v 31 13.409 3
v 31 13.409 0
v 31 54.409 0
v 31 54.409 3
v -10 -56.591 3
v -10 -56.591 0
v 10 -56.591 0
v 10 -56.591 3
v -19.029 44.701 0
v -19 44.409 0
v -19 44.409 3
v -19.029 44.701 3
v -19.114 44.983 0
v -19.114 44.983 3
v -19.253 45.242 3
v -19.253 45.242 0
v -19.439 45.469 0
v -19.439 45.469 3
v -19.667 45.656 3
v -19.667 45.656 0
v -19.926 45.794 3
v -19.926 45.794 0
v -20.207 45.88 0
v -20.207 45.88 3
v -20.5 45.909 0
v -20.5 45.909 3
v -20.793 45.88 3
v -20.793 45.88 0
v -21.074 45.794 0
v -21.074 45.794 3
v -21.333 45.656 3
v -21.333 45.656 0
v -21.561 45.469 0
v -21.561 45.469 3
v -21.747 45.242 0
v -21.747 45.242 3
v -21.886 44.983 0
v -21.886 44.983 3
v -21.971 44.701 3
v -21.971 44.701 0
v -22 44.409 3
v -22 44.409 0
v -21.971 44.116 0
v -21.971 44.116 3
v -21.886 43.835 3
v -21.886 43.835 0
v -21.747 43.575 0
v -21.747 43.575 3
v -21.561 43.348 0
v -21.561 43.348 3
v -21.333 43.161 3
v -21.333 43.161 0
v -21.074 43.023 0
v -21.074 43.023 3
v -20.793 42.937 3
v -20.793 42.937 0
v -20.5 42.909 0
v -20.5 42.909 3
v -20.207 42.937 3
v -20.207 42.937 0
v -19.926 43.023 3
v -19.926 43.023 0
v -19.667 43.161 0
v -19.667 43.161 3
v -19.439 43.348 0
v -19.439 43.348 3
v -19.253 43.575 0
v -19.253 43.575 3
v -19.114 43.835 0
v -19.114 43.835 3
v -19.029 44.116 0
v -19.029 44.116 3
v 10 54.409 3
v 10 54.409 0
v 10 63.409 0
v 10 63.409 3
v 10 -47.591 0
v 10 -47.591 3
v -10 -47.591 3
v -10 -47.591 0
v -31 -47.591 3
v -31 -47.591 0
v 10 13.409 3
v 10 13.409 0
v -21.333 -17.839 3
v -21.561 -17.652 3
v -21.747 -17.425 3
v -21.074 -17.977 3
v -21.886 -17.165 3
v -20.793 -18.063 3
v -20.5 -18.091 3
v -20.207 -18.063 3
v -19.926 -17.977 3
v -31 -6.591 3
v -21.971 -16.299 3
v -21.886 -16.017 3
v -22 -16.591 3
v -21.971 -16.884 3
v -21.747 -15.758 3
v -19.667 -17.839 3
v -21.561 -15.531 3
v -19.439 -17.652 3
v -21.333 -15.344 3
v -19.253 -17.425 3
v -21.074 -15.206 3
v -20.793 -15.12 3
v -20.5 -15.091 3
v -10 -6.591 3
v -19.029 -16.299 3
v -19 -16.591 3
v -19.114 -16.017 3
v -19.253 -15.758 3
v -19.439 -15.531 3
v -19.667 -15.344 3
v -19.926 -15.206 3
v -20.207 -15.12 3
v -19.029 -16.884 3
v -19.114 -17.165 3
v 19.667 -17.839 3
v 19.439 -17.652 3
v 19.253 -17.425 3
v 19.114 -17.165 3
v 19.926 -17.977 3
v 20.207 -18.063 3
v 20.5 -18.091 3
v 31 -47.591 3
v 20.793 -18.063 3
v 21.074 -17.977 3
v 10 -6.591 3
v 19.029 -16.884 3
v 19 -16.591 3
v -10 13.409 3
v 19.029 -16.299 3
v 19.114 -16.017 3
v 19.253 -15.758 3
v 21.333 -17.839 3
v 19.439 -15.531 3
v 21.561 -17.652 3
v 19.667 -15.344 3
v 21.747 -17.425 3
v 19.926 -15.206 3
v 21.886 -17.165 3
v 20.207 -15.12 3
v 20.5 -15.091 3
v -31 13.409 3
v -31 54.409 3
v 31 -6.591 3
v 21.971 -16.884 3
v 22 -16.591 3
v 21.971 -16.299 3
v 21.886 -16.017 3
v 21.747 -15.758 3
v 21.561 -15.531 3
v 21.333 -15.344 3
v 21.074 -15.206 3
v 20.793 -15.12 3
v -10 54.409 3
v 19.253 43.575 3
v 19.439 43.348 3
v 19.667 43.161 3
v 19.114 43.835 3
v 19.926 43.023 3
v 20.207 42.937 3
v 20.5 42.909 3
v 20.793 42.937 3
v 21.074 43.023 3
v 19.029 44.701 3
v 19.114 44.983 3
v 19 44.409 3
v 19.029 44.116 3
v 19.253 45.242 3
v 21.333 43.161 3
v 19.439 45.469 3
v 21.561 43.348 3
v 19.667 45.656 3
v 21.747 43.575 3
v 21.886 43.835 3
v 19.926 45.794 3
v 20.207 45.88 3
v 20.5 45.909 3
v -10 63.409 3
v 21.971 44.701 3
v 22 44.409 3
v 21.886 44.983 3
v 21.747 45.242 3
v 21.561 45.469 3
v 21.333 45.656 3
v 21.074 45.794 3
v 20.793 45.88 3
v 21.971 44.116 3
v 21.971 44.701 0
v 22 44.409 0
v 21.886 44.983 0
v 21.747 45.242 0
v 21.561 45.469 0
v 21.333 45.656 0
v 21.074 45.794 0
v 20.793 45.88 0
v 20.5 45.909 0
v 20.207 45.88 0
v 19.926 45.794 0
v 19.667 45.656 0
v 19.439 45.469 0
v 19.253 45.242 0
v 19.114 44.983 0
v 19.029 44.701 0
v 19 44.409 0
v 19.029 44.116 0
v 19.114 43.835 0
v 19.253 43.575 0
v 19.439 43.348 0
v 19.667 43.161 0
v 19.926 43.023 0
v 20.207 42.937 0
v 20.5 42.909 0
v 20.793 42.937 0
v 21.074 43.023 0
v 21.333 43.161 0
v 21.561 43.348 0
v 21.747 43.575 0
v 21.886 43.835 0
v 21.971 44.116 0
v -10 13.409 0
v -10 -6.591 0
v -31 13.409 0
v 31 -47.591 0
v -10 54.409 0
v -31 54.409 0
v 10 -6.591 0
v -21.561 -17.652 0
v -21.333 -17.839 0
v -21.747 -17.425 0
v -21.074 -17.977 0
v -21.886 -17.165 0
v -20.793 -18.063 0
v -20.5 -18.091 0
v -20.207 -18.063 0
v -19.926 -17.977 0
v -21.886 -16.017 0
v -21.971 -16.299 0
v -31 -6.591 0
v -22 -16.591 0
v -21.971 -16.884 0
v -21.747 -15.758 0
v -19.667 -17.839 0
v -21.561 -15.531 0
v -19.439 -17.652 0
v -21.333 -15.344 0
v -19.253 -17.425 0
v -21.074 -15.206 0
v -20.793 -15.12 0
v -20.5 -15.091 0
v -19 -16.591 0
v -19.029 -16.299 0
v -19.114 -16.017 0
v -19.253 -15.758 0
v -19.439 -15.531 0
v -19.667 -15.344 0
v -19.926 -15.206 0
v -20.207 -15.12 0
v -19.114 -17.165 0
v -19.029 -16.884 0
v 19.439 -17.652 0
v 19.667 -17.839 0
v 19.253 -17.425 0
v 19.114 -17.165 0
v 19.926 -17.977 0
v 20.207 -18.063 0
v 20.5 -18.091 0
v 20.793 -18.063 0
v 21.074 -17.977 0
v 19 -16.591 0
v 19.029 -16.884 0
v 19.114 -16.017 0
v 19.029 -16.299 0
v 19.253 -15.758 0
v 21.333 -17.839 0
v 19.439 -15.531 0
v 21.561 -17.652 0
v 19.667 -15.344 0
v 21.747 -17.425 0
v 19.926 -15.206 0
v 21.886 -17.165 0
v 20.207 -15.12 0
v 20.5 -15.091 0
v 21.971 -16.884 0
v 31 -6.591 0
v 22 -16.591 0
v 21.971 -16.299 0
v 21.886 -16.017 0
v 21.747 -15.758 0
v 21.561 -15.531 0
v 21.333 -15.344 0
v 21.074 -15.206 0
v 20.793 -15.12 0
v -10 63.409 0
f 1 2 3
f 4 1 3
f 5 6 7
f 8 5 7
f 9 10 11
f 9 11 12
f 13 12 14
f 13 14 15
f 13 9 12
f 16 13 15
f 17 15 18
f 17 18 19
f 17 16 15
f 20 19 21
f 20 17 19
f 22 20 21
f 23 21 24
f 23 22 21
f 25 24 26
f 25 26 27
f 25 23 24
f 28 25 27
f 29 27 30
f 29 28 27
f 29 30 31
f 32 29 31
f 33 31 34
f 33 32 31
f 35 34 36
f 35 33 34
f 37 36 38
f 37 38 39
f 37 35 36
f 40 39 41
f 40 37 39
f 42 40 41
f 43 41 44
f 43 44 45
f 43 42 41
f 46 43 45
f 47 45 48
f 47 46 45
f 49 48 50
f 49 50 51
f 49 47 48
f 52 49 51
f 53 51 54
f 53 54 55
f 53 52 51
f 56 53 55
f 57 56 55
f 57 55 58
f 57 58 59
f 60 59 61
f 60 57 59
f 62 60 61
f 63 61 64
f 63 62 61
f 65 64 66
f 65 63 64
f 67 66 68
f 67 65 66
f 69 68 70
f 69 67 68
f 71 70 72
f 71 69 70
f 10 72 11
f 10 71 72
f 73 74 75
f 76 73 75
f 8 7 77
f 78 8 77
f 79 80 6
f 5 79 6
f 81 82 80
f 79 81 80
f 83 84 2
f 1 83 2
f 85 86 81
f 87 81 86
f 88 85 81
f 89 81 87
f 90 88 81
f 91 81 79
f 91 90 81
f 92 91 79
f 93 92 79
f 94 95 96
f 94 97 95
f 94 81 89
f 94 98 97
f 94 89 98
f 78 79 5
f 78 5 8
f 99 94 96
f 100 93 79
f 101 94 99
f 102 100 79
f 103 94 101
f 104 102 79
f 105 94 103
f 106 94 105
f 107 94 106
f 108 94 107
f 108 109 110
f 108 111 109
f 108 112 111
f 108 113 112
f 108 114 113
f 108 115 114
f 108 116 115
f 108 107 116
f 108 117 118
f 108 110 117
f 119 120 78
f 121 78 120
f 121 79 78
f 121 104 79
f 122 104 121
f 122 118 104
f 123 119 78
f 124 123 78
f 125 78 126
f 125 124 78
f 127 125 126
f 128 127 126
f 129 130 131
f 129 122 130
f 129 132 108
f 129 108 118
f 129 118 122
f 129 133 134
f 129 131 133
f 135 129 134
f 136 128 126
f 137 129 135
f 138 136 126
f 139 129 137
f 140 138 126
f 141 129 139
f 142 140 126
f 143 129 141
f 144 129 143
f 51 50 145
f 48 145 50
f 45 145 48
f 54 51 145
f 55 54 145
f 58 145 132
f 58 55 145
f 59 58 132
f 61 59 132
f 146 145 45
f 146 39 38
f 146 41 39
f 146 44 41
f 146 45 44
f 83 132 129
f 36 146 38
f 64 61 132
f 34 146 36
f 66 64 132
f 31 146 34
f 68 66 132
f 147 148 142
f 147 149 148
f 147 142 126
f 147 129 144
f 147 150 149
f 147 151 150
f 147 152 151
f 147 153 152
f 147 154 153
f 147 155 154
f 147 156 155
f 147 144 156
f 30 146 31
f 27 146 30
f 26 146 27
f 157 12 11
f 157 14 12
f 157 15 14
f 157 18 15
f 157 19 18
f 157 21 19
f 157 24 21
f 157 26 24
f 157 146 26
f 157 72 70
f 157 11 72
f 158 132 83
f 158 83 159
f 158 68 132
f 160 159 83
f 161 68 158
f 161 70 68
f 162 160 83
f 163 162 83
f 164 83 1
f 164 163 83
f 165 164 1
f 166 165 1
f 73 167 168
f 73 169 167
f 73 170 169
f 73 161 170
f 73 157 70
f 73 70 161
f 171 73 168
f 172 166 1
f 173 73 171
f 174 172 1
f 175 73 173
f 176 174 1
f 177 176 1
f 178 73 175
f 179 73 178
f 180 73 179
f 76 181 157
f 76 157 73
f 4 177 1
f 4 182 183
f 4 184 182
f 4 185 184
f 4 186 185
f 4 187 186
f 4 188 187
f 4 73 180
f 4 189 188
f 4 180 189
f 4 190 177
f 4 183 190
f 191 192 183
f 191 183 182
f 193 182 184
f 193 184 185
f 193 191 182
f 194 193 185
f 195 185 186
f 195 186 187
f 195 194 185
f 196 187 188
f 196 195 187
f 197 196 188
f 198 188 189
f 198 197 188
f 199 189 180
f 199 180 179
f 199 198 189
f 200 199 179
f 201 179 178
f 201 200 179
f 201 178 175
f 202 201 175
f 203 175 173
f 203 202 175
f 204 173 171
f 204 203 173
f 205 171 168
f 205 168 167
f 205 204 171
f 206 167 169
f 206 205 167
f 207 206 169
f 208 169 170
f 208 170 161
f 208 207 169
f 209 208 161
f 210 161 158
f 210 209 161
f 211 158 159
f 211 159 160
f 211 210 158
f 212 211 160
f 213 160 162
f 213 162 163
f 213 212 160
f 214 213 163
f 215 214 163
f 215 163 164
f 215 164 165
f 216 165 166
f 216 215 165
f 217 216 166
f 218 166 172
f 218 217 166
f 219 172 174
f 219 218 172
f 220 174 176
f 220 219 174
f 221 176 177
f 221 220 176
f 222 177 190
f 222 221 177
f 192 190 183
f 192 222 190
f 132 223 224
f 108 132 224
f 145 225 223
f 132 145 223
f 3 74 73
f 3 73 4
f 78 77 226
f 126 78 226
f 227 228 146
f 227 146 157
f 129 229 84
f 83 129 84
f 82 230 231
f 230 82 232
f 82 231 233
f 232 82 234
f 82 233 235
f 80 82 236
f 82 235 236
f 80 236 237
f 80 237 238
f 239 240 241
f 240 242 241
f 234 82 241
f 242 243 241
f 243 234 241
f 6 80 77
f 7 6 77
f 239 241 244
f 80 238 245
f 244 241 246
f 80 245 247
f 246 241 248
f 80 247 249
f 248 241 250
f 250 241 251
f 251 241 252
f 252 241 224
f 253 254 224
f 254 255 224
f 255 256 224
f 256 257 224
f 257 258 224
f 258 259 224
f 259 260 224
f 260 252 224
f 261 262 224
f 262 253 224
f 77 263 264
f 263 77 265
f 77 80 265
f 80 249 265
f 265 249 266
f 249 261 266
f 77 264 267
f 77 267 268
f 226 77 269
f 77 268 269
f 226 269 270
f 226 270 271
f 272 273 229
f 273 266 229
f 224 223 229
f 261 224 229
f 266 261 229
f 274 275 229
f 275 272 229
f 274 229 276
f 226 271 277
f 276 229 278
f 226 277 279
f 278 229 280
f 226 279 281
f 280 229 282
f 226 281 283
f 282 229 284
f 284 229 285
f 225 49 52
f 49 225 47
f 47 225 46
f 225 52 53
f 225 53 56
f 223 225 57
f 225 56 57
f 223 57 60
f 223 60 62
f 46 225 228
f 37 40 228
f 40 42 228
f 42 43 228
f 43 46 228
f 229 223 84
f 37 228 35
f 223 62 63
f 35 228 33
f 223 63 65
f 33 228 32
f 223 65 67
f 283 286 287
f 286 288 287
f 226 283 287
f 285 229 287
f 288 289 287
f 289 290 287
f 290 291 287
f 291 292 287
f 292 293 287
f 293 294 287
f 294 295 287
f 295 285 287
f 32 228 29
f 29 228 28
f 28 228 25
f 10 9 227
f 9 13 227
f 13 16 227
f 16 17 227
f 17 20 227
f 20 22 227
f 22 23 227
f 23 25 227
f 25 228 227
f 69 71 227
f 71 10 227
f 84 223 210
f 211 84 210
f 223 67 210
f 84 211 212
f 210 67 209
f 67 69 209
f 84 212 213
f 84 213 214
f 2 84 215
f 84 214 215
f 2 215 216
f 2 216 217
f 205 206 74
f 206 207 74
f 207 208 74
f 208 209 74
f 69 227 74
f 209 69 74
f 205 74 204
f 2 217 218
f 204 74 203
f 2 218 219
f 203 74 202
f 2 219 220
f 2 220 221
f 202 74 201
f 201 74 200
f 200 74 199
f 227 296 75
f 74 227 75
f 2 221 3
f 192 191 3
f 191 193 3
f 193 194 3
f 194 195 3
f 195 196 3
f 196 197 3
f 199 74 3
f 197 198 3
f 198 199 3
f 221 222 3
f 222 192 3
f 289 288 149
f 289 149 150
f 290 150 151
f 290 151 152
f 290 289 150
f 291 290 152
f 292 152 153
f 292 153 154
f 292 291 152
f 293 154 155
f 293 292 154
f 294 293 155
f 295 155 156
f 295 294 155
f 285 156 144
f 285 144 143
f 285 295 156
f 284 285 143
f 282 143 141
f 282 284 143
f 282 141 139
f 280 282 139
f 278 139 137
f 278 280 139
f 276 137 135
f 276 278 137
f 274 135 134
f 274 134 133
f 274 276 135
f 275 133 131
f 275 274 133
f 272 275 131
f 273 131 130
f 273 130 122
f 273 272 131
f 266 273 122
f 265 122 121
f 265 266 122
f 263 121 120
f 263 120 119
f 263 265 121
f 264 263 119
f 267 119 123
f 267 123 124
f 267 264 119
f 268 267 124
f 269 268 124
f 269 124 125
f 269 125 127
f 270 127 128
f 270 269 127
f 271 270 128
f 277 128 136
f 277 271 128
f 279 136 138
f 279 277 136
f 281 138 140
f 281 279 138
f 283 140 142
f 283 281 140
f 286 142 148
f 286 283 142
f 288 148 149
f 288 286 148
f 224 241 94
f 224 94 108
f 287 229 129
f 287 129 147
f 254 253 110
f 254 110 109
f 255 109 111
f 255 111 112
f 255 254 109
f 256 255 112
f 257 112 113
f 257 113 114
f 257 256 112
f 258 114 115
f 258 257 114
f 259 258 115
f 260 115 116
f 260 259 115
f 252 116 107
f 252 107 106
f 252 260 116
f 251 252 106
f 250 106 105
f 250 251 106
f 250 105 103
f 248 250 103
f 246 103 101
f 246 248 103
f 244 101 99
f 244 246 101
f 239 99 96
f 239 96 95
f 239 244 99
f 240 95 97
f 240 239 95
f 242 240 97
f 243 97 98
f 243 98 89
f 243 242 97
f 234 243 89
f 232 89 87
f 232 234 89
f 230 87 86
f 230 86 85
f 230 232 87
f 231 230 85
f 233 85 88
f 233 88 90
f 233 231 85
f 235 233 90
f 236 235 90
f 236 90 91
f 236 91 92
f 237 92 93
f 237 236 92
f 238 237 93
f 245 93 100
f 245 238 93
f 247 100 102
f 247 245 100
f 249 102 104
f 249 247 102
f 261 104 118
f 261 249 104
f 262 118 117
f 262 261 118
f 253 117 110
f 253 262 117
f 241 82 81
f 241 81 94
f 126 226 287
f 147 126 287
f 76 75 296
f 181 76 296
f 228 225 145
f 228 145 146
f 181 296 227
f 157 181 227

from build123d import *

# Parameters (mm, degrees)
CROQUIS2_R              = 1.5
SALIENTE_EXTRUIR1_DEPTH = 3


with BuildPart() as part:
    # Croquis2 → Saliente-Extruir1 (new body)
    with BuildSketch(Plane.XY):
        Polygon((-10, -56.591411495), (10, -56.591411495), (10, -47.591411495), (31, -47.591411495), (31, -6.591411495), (10, -6.591411495), (10, 13.408588505), (31, 13.408588505), (31, 54.408588505), (10, 54.408588505), (10, 63.408588505), (-10, 63.408588505), (-10, 54.408588505), (-31, 54.408588505), (-31, 13.408588505), (-10, 13.408588505), (-10, -6.591411495), (-31, -6.591411495), (-31, -47.591411495), (-10, -47.591411495), align=None)
        with Locations((-20.5, -16.591411495)):
            Circle(CROQUIS2_R, mode=Mode.SUBTRACT)
        with Locations((-20.5, 44.408588505)):
            Circle(CROQUIS2_R, mode=Mode.SUBTRACT)
        with Locations((20.5, 44.408588505)):
            Circle(CROQUIS2_R, mode=Mode.SUBTRACT)
        with Locations((20.5, -16.591411495)):
            Circle(CROQUIS2_R, mode=Mode.SUBTRACT)
    extrude(amount=SALIENTE_EXTRUIR1_DEPTH)


solid = part.part
